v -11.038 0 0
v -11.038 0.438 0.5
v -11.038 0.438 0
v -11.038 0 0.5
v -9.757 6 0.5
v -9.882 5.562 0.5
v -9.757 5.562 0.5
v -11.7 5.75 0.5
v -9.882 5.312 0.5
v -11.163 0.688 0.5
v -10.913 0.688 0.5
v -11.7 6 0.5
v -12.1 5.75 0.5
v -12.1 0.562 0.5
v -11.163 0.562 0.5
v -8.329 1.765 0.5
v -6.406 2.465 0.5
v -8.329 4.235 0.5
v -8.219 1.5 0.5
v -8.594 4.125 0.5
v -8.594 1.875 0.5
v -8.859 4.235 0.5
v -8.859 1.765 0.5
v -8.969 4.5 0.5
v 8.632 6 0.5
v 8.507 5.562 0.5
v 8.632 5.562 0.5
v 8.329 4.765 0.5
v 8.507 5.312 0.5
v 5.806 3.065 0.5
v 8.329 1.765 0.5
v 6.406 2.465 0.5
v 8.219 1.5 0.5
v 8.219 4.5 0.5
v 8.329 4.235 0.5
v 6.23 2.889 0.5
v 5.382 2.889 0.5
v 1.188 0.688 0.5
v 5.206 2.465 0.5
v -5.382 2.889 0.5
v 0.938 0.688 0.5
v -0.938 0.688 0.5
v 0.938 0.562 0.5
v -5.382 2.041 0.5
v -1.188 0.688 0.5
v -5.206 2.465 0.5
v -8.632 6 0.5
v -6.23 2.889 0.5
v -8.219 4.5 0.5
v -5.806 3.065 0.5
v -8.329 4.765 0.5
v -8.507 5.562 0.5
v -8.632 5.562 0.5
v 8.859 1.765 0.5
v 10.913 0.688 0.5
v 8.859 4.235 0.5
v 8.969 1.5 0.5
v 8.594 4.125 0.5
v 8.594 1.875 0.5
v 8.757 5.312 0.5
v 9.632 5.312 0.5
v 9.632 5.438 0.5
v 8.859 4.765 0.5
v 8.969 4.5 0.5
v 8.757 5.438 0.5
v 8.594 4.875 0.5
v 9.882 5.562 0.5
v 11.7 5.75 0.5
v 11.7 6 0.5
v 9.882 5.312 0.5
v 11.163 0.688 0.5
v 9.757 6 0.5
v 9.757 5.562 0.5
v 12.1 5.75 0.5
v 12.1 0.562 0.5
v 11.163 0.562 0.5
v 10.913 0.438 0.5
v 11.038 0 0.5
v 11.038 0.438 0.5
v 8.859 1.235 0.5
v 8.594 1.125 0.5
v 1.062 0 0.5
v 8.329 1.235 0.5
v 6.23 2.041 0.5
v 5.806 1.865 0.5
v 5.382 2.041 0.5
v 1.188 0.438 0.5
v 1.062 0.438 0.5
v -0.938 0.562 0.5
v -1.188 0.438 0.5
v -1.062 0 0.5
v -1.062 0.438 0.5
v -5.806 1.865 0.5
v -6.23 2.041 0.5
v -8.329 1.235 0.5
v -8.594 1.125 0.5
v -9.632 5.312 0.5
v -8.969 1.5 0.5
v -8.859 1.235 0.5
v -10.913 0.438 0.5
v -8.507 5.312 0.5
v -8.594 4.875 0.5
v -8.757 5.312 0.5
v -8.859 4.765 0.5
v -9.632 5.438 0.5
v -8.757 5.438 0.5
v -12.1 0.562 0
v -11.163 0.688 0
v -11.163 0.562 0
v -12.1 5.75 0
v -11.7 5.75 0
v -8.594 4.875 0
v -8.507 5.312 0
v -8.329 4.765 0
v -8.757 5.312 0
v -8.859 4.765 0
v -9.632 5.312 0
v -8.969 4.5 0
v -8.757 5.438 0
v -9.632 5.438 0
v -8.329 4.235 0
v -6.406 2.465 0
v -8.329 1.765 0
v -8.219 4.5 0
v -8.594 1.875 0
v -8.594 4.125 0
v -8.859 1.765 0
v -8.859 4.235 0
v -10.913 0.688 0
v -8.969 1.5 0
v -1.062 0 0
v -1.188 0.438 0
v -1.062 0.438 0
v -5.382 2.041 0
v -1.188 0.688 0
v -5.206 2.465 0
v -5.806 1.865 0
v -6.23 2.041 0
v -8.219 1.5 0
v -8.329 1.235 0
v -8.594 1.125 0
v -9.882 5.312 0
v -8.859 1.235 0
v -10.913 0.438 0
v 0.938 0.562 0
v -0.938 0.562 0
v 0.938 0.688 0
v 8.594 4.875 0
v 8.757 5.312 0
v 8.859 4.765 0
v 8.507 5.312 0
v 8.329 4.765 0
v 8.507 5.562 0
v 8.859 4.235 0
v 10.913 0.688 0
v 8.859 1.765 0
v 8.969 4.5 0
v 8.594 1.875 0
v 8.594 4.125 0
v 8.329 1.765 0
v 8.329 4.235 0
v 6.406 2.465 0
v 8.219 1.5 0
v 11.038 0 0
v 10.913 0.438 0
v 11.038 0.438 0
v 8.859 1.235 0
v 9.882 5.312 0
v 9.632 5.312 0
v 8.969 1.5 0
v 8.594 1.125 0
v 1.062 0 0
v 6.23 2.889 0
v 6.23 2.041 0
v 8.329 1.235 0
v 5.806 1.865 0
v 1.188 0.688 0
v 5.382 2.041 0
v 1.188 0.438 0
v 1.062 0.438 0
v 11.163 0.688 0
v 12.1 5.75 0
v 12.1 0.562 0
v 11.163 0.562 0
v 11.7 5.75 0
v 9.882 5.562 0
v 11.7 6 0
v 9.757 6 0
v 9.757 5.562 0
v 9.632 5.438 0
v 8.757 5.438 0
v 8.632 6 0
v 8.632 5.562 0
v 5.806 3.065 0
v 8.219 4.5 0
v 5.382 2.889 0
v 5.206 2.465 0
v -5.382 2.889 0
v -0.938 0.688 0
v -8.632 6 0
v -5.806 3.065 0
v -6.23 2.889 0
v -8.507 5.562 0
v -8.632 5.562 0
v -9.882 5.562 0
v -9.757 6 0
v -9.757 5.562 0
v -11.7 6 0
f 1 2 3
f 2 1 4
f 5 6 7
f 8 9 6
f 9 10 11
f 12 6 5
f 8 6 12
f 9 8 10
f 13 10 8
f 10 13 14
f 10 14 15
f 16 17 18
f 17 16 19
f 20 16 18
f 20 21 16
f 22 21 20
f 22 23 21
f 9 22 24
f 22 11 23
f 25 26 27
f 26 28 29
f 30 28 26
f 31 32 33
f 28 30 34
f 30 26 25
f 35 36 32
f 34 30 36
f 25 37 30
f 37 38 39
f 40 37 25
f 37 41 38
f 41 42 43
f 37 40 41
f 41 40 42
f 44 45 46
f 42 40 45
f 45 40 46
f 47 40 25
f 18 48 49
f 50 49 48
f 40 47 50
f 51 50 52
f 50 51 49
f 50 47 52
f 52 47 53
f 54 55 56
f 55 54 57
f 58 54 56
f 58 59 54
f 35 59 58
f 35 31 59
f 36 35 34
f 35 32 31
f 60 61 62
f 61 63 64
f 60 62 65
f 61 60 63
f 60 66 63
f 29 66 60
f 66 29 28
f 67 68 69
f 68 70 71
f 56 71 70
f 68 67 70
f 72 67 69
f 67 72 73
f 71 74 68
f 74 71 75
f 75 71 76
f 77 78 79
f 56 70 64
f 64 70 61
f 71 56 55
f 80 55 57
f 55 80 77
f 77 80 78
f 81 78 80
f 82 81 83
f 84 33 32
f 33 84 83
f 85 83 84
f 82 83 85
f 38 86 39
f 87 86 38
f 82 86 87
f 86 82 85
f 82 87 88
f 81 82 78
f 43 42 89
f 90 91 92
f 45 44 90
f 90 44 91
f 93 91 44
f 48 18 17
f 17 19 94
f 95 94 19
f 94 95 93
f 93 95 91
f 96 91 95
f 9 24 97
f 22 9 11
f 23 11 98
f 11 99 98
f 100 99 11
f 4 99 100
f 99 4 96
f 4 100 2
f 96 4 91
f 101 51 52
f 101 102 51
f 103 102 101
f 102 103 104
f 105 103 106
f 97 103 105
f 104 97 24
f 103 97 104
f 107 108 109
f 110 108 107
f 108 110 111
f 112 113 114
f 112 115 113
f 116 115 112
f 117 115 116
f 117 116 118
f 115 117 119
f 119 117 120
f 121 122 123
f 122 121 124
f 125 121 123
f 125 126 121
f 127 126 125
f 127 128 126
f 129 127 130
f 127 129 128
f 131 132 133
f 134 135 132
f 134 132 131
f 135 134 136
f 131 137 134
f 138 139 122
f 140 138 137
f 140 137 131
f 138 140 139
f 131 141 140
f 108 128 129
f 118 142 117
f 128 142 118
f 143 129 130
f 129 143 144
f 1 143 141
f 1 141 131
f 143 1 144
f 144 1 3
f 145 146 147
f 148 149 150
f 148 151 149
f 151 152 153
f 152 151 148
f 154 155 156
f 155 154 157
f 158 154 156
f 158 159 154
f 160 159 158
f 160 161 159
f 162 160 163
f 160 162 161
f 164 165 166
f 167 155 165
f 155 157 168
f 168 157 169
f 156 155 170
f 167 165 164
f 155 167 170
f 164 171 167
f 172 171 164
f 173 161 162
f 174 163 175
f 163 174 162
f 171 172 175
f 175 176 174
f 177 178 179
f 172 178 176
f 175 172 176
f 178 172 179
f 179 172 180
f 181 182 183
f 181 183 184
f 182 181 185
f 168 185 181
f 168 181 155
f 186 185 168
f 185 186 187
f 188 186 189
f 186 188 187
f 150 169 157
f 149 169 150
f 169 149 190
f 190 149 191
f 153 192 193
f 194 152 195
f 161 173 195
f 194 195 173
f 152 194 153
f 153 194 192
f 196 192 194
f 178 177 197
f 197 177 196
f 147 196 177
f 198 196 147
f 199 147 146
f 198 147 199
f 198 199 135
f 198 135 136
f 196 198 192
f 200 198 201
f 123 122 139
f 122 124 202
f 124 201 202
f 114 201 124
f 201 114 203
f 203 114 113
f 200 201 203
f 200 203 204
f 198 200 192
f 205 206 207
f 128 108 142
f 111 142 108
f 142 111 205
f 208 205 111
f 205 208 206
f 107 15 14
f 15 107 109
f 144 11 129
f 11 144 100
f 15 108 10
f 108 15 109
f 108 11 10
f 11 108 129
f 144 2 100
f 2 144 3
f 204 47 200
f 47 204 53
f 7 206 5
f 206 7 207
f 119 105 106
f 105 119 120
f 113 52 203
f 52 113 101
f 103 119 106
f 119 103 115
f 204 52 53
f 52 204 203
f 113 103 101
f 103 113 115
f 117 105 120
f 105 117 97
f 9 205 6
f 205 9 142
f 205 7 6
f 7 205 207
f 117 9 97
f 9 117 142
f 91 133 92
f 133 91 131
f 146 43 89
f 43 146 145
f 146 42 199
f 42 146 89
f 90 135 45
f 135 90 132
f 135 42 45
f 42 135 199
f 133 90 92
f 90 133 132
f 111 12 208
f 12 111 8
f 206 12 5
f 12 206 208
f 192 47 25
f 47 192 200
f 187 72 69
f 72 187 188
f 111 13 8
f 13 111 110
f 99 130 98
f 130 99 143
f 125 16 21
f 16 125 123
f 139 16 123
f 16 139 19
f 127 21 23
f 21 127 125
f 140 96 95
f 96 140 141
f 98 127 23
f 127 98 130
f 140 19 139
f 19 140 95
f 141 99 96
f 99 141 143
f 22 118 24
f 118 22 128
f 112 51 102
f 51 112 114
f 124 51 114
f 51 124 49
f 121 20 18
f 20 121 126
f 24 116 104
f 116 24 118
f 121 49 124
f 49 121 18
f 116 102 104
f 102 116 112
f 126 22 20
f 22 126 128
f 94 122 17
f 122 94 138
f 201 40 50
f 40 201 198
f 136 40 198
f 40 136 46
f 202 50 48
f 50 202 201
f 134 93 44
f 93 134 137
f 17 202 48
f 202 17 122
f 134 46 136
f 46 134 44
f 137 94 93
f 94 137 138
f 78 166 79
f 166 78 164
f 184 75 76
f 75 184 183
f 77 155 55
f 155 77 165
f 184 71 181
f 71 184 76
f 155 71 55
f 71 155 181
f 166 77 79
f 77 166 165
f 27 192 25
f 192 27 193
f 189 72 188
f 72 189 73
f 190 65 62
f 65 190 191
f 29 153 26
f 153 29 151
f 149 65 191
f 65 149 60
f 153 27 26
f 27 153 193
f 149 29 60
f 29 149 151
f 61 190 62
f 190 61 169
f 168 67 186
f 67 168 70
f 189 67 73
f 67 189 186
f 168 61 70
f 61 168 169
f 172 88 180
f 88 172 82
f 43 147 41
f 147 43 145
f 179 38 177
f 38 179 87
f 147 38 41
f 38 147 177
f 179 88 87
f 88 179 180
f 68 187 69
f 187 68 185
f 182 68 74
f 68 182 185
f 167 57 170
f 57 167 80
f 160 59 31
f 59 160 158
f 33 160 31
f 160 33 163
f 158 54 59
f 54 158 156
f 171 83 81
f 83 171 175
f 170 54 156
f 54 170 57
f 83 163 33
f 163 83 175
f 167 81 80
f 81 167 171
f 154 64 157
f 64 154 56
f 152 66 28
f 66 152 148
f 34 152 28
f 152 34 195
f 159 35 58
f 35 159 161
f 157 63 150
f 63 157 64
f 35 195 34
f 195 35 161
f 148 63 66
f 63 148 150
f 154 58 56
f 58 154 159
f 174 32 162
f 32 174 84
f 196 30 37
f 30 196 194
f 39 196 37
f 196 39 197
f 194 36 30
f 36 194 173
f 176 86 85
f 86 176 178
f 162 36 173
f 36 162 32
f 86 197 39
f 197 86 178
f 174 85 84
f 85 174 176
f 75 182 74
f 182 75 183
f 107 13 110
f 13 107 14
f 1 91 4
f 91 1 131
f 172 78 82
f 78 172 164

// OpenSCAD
// file: modus.scad
//Corner Joint - allows the sides of two parts to create inlayed corner. Aids with welding.
//need to verify module math is the same throughout all parts.

module cornerjoint(Z,L,H,EndGap,PadL,PadH,CJangle,CJcenter){
    //change so that H = Z of inlayed part (usually 0.5)
    //add center and angle in degrees option, orgin far side of cut out area

     if((CJangle==0)&&(CJcenter==0))
      {    
        translate([0,0,0])
        rotate([0,0,CJangle])
        difference(){
        cube([L,H+PadH,Z]);
        translate([EndGap,H,0])
        cube([PadL,PadH,Z]);
        translate([L-EndGap-PadL,H,0])
        cube([PadL,PadH,Z]);}
      }    
else if((CJangle==90)&&(CJcenter==0))
      {    
        translate([H+PadH,0,0])
        rotate([0,0,CJangle])
        difference(){
        cube([L,H+PadH,Z]);
        translate([EndGap,H,0])
        cube([PadL,PadH,Z]);
        translate([L-EndGap-PadL,H,0])
        cube([PadL,PadH,Z]);}
      }
else if((CJangle==180)&&(CJcenter==0))       
      {    
        translate([L,H+PadH,0])
        rotate([0,0,CJangle])
        difference(){
        cube([L,H+PadH,Z]);
        translate([EndGap,H,0])
        cube([PadL,PadH,Z]);
        translate([L-EndGap-PadL,H,0])
        cube([PadL,PadH,Z]);}
      }
else if((CJangle==270)&&(CJcenter==0))
      {    
        translate([0,L,0])
        rotate([0,0,CJangle])
        difference(){
        cube([L,H+PadH,Z]);
        translate([EndGap,H,0])
        cube([PadL,PadH,Z]);
        translate([L-EndGap-PadL,H,0])
        cube([PadL,PadH,Z]);}
      }  
      
//centered     
   
else if((CJangle==0)&&(CJcenter==1))
      {    
        translate([-L/2,0,0])
        rotate([0,0,CJangle])
        difference(){
        cube([L,H+PadH,Z]);
        translate([EndGap,H,0])
        cube([PadL,PadH,Z]);
        translate([L-EndGap-PadL,H,0])
        cube([PadL,PadH,Z]);}
      }  
else if((CJangle==90)&&(CJcenter==1))
      {    
        translate([0,-L/2,0])
        rotate([0,0,CJangle])
        difference(){
        cube([L,H+PadH,Z]);
        translate([EndGap,H,0])
        cube([PadL,PadH,Z]);
        translate([L-EndGap-PadL,H,0])
        cube([PadL,PadH,Z]);}
      }
else if((CJangle==180)&&(CJcenter==1))       
      {    
        translate([L/2,0,0])
        rotate([0,0,CJangle])
        difference(){
        cube([L,H+PadH,Z]);
        translate([EndGap,H,0])
        cube([PadL,PadH,Z]);
        translate([L-EndGap-PadL,H,0])
        cube([PadL,PadH,Z]);}
      }
else if((CJangle==270)&&(CJcenter==1))
      {    
        translate([0,L/2,0])
        rotate([0,0,CJangle])
        difference(){
        cube([L,H+PadH,Z]);
        translate([EndGap,H,0])
        cube([PadL,PadH,Z]);
        translate([L-EndGap-PadL,H,0])
        cube([PadL,PadH,Z]);}
      }
} //end cornerjoint module

//Tab Insert - used to cut a hole for an abutting part to insert into. Typically aids with welding the two parts.
module tabinsert(X,Y,Z,dGap,cGap,c1,c2,c3,c4,c5,c6,c7,c8,center){
    translate([-dGap-(center*(X/2)),-dGap-(center*(Y/2)),0]){
        //main cut
        cube([X+(dGap*2),Y+(dGap*2),Z]);
        //corner c1c2
        translate([-cGap,(Y+(dGap*2))-c1+cGap,0])
            {
        cube([c2,c1,Z]);}
       //corner c3c4
       translate([(X+(dGap*2))-c3+cGap,(Y+(dGap*2))-c4+cGap,0]){
           cube([c3,c4,Z]);
       }
       //corner c5c6
       translate([(X+(dGap*2))-c6+cGap,-cGap,0])
      {
          cube([c6,c5,Z]);
      }
       
       //corner c7c8 
       translate([-cGap,-cGap,0]){
           cube([c7,c8,Z]);
       }
    
    } //end center translate
} //end tabinsert module
 
// file: vars.scad
brickW=6; 
brickL=12;
brickCH=6;

$fn=8; //defines resolution of circles. 8 is okay for review. 100  or greater should be used for for final dxf export.

dZstandard=0.5; //thickness of steel to be cut for drawer parts
fZstandard=0.5;
aZstandard=0.5; //thickness of steel to be cut for arm parts

fBOLTHOLEstandardD=1; //standard bolts used on frame
sliderodholeOD=1.2; 

dGap=0.03125; //gap between a hole cut's edge and the part sitting within the hole. //D3 appears to use 0.3125, is this in error?

//all parts set to standard thickness below
//off standard preferences can be defined below

//drawer
drawergap=0.0283;  //extra room for drawer to slide in the space between f1 and f4
drawerHgap=0.1884;  //total extra space from drawer sides to frame walls. sum of both sides.

d1z=dZstandard;
d2z=dZstandard;
d3z=dZstandard;
d4z=dZstandard;
d5z=dZstandard;
d6z=dZstandard;
d5z=dZstandard;
d7z=dZstandard;
d8z=dZstandard;
d9z=dZstandard;

//frame
f1x=24.2;
f1y=6;
f1z=0.5;


f2y=3.5;
f2z=fZstandard;

f3x=f1x;
f3y=3.5;
f3z=fZstandard;

f4y=11;
f4z=fZstandard;

f5y=3.5;
f5z=fZstandard;

f6y=8;
f6z=fZstandard;

f8y=brickW;
f8z=fZstandard;
f8boltD=1;

f9y=4.5;
f9x=43.5;  //set based on MAINcylinder
f9z=fZstandard;

f8x=f9x;

f11x=1.25;
f11z=fZstandard;

f13z=fZstandard;

//arms

a1x=4;
a1y=72; //calculate based on drawer cylinder
a1z=aZstandard;

a2x=6;
a2y=72;  //calculate based on drawer cylinder
a2z=aZstandard;

a4z=aZstandard;
a6z=aZstandard;

//
//Input your main cylinder's dimenions here
//
cylinderMAINminC2E=0; //main hydraulic cylinder's distance from center of mounting hole to the end of the shaft when fully compressed.
cylinderMAINmaxC2E=0; //main hydraulic cylinder's distance from center of mounting hole to the end of the shaft when fully extended.

//
//Input your drawer cylinder's dimenions here
//
cylinderDRAWERbodyH=3; //measured when in position, largest length from top to bottom of cylinder
cylinderDRAWERminC2C=0; //drawer's hydraulic cylinder's distance from the center of one mounting hole to the center of the other when fully compressed.
cylinderDRAWERmaxC2C=0; ///drawer's hydraulic cylinder's distance from the center of one mounting hole to the center of the other when fully extended.
cylinderDRAWERrodclevisW=2.5; //width of cylinders' clevis on end of rod
cylinderDRAWERrodclevisID=1;
cylinderDRAWERrodclevisOD=2;
cylinderDRAWERrearclevisW=2.5; //width of mounting clevis cylinder body
cylinderDRAWERrearclevisID=1;
cylinderDRAWERrearclevisOD=2;
cylinderDRAWERrearclevisClearance=3; //usable space around rear clevis pin (in diameter). be aware of hyraulic fittings.

//the following variables are calculated in order of dependence on preceding variables
d3x=brickL+(d2z*2);
d3y=brickCH-d1z;
d4x=brickW+d3z+d3z;
d4y=brickCH-d1z;
d5x=brickL+(d2z*2);
d5y=brickW;
d6x=brickL+(d2z*2);
d6y=brickCH;
d7x=cylinderDRAWERrearclevisClearance;
d7y=a4z+d8z+cylinderDRAWERbodyH;
d9x=cylinderDRAWERbodyH+d6z;
d9y=cylinderDRAWERbodyH+d8z;
d8x=brickL+(d2z*2);
d8y=max(5,(d9x-d6z));   //need to review fundamentals, 5 minimun unless d9 gets larger than d8
d1x=18.5;   //need to come up with a formula
d1y=18;     //need to come up with a formula
d2x=d8y+d6z+brickW+d3z+d5y+d3z;
d2y=brickCH;

f11y=f8y;
f6x=brickL+(d2z*2)+(f9y*2)+drawerHgap;
f8x=43.5;  //need to define based on MAINcylinder inputs


f2x=brickL+(d2z*2)+drawerHgap+(f9y*2)-(1.4*2);  //distance between large cut outs in f9

f5x=brickL+(d2z*2)+drawerHgap+(f9y*2)+(a1x*2); //distance between outer edges of each A1

f4x=f5x-0.5;   //same as f5 but minus 0.25 on each side to give a little overhang
// main file
include <vars.scad>;
use <modus.scad>;

f1p();

module f1p(){
    
difference(){
translate([-(f1x/2),0,0])
cube([f1x,f1y,f1z]);
translate([-(f1x/2),0,0])
cuts();
translate([(f1x/2),0,0])
mirror([1,0,0])
cuts();
} //end difference
module cuts(){
    tabinsert(1,f3z,f1z,0.0625,0.125,0,0,0.25,0.25,0.0,0,0,0,0);
    
    translate([0,f1y-0.25,0])
        cube([0.4,0.25,f1z]);     //appears to be intended to interface with A2, but not sure why
    translate([(f1x-f2x)/2,f1y-f2z,0])
        tabinsert(1,f2z,f1z,0.0625,0.125,0,0,0,0,0.25,0.25,0.25,0.25,0);    //f2
    translate([(f1x/2)-1,0,0])
        tabinsert(1,f3z,f1z,0.0625,0.125,0.25,0.25,0,0,0.0,0,0,0,0); 
    translate([((f1x-d3x-drawerHgap)/2)-2,1.5,0])  //bolt center to inner edge of f9=2
        cylinder(h = f1z, r = 0.375);   
    translate([((f1x-d3x-drawerHgap)/2)-2,4.5,0])
        cylinder(h = f1z, r = 0.375);
    translate([((f1x-d3x-drawerHgap)/2)+(sliderodholeOD/2)+drawerHgap,2.465,0]) //not sure what this is supposed to align with, drawer?
        cylinder(h = f1z, r = sliderodholeOD/2);     
} //end cuts module

} //end f1p module
